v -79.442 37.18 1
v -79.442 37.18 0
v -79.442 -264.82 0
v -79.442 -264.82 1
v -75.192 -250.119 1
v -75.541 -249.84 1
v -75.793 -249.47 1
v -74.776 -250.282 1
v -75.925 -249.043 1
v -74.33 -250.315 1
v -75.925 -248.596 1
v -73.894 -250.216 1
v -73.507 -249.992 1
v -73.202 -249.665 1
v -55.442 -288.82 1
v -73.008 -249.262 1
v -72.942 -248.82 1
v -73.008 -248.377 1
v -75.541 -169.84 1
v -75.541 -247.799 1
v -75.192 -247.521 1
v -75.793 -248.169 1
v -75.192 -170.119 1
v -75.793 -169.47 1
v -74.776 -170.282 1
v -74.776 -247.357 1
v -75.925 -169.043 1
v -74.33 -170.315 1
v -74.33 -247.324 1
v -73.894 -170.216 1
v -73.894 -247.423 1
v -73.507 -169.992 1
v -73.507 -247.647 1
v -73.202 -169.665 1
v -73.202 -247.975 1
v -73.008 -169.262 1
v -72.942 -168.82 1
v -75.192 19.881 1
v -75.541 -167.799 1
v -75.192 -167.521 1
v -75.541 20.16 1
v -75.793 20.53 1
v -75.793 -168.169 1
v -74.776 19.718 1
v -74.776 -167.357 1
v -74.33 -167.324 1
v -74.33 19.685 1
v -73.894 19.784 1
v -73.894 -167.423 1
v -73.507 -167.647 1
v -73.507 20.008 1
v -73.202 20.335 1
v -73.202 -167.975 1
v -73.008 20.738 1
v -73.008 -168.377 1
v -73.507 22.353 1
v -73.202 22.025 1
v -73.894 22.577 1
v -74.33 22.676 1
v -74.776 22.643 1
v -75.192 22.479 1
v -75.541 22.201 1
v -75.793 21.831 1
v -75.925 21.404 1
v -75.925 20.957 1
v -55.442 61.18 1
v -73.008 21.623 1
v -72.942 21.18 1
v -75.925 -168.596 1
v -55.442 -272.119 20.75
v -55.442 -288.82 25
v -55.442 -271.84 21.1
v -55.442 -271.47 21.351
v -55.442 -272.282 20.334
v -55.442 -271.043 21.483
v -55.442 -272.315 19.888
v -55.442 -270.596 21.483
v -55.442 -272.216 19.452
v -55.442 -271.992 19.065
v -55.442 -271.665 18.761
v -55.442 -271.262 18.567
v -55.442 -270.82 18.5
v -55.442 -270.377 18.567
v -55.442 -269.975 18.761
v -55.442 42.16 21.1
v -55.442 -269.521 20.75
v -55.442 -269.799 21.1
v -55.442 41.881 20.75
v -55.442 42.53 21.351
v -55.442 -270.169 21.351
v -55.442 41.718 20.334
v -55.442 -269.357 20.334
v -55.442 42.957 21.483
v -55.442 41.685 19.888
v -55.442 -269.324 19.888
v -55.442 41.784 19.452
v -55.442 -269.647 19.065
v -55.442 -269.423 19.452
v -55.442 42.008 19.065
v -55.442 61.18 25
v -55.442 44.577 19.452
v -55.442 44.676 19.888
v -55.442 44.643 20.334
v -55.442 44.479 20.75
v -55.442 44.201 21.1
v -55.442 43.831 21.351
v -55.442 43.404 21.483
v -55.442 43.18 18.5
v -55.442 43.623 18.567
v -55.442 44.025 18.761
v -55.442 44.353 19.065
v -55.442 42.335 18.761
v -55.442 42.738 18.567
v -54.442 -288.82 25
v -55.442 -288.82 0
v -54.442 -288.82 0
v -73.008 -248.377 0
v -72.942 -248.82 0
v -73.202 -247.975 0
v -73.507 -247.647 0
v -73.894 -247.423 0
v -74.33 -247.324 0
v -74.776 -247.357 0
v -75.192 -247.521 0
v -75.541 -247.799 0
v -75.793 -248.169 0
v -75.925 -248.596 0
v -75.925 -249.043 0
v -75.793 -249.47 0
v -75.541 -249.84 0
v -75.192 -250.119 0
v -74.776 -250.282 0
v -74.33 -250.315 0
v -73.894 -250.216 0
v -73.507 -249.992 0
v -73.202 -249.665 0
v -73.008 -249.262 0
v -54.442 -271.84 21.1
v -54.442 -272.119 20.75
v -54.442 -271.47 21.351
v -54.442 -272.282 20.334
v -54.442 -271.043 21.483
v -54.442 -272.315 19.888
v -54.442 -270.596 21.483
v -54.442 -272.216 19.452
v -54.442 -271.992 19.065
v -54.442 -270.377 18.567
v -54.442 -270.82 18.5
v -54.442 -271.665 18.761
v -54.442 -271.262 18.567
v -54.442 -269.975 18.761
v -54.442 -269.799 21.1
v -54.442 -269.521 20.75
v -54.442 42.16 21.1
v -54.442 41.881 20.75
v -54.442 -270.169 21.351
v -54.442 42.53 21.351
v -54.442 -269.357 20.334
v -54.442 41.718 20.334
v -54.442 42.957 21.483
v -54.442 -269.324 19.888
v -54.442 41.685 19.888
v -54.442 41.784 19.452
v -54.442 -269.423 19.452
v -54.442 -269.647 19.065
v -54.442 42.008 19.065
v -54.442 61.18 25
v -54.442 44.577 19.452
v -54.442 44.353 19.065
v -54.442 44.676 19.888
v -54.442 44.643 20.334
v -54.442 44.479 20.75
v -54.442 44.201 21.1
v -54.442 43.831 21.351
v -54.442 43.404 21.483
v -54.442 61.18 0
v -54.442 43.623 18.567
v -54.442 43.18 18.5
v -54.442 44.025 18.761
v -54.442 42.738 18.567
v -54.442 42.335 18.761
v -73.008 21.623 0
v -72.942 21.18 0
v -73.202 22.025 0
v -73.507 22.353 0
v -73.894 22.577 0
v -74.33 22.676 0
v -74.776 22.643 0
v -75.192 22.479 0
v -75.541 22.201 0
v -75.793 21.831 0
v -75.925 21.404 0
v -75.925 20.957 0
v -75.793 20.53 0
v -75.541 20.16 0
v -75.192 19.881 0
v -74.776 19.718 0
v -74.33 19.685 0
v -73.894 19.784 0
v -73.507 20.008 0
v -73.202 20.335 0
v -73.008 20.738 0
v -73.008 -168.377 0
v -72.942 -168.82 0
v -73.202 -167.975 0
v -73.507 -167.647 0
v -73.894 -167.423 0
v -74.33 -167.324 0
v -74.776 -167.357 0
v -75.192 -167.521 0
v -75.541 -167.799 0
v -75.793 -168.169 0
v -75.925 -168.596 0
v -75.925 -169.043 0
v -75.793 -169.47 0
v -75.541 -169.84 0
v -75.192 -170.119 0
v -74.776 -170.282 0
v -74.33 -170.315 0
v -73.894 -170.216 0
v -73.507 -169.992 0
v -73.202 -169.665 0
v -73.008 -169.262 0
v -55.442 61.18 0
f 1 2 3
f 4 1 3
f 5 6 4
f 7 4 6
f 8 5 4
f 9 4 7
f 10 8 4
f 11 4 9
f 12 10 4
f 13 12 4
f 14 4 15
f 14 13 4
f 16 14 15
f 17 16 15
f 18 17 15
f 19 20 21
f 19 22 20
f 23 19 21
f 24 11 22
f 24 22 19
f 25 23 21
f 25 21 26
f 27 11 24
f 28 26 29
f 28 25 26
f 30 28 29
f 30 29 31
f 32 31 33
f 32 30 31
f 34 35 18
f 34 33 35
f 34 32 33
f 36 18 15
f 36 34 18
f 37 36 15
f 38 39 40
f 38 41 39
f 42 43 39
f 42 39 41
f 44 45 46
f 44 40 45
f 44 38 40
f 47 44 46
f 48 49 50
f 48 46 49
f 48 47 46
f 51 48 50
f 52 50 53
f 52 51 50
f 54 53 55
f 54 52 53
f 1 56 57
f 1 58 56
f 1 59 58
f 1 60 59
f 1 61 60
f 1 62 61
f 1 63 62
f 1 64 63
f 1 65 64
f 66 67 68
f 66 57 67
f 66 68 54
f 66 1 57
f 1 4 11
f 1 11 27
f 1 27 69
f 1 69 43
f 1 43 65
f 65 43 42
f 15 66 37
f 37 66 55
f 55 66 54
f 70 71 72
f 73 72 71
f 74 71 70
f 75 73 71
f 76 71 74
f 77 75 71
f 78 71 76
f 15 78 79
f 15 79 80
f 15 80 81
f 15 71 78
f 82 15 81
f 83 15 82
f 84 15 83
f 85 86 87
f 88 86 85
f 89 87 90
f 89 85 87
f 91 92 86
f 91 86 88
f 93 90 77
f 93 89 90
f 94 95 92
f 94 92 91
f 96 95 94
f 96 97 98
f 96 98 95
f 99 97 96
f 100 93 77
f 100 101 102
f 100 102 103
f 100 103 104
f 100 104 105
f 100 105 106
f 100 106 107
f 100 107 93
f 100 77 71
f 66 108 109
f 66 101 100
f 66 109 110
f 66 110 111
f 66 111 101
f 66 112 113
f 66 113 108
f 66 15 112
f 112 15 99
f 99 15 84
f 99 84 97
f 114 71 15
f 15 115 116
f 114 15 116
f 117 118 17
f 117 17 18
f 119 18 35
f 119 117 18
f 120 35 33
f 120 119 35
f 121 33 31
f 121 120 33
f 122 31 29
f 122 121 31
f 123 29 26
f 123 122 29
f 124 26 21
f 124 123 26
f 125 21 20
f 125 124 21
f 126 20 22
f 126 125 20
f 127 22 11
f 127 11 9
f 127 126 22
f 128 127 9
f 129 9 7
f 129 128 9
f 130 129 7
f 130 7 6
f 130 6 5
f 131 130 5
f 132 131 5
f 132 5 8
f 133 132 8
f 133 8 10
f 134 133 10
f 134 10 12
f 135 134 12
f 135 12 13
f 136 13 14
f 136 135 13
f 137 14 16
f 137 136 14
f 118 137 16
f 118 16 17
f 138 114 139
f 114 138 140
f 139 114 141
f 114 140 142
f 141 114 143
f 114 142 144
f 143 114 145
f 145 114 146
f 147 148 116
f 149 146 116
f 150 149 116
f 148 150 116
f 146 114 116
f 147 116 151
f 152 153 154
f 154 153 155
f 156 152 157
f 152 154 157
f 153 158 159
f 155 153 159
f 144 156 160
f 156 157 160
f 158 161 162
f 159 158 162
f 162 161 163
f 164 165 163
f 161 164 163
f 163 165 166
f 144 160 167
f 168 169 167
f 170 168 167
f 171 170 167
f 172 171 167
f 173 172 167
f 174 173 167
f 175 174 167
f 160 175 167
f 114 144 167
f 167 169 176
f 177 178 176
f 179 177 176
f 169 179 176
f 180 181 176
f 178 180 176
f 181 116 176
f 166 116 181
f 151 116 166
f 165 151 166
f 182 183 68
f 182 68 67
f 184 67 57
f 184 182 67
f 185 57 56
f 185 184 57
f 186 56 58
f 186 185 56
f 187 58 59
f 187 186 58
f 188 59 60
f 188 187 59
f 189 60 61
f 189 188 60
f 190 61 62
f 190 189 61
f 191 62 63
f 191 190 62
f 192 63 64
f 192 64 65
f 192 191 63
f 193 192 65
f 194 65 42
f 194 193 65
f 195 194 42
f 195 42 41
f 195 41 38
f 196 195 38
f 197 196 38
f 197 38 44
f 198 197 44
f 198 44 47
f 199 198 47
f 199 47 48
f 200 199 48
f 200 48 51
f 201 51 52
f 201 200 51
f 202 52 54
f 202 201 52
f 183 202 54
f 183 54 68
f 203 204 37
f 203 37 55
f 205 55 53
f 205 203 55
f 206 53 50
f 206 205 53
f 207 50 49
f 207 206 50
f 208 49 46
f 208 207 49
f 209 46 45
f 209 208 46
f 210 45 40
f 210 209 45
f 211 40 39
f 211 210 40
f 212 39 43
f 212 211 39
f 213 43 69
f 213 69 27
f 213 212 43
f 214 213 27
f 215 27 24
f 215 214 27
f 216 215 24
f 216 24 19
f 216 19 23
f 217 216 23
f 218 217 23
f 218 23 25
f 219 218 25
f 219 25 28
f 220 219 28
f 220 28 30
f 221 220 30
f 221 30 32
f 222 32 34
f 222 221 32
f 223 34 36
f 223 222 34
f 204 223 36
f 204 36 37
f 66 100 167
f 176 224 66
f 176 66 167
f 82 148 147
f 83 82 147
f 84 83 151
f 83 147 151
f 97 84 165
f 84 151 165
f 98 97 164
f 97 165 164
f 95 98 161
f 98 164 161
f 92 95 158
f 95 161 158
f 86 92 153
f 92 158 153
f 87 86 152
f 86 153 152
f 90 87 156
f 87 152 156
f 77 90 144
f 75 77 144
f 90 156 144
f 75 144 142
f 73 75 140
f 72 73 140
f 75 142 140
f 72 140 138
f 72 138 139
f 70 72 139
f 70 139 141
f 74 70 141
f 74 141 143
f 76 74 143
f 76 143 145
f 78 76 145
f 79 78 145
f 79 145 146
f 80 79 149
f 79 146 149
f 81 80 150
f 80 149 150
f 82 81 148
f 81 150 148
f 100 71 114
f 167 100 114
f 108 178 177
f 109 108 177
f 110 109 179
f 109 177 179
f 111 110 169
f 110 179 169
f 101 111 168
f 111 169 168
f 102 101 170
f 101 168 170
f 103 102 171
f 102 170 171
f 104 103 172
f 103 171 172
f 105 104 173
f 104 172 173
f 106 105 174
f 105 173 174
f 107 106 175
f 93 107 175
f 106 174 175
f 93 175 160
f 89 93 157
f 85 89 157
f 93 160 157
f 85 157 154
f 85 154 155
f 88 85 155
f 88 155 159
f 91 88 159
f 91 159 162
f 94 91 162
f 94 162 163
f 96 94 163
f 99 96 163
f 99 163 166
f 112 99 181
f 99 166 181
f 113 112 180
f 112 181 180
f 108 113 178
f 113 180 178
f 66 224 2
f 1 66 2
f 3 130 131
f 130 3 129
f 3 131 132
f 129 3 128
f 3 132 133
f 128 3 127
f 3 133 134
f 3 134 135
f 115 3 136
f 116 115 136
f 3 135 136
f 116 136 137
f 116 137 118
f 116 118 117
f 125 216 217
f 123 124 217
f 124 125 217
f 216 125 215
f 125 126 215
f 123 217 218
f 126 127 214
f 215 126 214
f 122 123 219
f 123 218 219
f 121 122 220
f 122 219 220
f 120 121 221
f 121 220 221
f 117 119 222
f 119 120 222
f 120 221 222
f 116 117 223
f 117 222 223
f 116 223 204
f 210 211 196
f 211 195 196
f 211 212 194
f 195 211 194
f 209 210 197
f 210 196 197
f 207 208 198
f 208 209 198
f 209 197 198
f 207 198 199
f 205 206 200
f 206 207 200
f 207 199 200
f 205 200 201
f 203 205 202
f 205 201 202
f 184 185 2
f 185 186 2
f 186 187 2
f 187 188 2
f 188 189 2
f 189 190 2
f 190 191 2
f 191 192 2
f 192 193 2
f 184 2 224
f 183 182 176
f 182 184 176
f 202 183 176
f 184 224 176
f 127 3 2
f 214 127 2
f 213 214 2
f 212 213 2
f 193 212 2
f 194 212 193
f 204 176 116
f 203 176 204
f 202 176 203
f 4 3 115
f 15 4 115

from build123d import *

# Parameters (mm, degrees)
CROQUIS2_W              = 1
CROQUIS2_H              = 350
SALIENTE_EXTRUIR2_DEPTH = 25
CROQUIS5_R              = 1.5
CORTAR_EXTRUIR2_DEPTH   = 1
CROQUIS1_R              = 1.5
SALIENTE_EXTRUIR3_DEPTH = 1


with BuildPart() as part:
    # Croquis2 → Saliente-Extruir2 (new body)
    with BuildSketch(Plane.XY):
        with Locations((-54.941785307, -113.819624774)):
            Rectangle(CROQUIS2_W, CROQUIS2_H)
    extrude(amount=SALIENTE_EXTRUIR2_DEPTH)

    # Croquis5 → Cortar-Extruir2 (cut)
    with BuildSketch(Plane(origin=(-54.441785307, 0, 0), x_dir=(0, 0, -1), z_dir=(1, 0, 0))):
        with Locations((-20, 43.180375226)):
            Circle(CROQUIS5_R)
        with Locations((-20, -270.819624774)):
            Circle(CROQUIS5_R)
    extrude(amount=-CORTAR_EXTRUIR2_DEPTH, mode=Mode.SUBTRACT)

    # Croquis1 → Saliente-Extruir3 (add)
    with BuildSketch(Plane.XY):
        Polygon((-55.441785307, 61.180375226), (-79.441785307, 37.180375226), (-79.441785307, -264.819624774), (-55.441785307, -288.819624774), align=None)
        with Locations((-74.441785307, 21.180375226)):
            Circle(CROQUIS1_R, mode=Mode.SUBTRACT)
        with Locations((-74.441785307, -248.819624774)):
            Circle(CROQUIS1_R, mode=Mode.SUBTRACT)
        with Locations((-74.441785307, -168.819624774)):
            Circle(CROQUIS1_R, mode=Mode.SUBTRACT)
    extrude(amount=SALIENTE_EXTRUIR3_DEPTH)


solid = part.part
